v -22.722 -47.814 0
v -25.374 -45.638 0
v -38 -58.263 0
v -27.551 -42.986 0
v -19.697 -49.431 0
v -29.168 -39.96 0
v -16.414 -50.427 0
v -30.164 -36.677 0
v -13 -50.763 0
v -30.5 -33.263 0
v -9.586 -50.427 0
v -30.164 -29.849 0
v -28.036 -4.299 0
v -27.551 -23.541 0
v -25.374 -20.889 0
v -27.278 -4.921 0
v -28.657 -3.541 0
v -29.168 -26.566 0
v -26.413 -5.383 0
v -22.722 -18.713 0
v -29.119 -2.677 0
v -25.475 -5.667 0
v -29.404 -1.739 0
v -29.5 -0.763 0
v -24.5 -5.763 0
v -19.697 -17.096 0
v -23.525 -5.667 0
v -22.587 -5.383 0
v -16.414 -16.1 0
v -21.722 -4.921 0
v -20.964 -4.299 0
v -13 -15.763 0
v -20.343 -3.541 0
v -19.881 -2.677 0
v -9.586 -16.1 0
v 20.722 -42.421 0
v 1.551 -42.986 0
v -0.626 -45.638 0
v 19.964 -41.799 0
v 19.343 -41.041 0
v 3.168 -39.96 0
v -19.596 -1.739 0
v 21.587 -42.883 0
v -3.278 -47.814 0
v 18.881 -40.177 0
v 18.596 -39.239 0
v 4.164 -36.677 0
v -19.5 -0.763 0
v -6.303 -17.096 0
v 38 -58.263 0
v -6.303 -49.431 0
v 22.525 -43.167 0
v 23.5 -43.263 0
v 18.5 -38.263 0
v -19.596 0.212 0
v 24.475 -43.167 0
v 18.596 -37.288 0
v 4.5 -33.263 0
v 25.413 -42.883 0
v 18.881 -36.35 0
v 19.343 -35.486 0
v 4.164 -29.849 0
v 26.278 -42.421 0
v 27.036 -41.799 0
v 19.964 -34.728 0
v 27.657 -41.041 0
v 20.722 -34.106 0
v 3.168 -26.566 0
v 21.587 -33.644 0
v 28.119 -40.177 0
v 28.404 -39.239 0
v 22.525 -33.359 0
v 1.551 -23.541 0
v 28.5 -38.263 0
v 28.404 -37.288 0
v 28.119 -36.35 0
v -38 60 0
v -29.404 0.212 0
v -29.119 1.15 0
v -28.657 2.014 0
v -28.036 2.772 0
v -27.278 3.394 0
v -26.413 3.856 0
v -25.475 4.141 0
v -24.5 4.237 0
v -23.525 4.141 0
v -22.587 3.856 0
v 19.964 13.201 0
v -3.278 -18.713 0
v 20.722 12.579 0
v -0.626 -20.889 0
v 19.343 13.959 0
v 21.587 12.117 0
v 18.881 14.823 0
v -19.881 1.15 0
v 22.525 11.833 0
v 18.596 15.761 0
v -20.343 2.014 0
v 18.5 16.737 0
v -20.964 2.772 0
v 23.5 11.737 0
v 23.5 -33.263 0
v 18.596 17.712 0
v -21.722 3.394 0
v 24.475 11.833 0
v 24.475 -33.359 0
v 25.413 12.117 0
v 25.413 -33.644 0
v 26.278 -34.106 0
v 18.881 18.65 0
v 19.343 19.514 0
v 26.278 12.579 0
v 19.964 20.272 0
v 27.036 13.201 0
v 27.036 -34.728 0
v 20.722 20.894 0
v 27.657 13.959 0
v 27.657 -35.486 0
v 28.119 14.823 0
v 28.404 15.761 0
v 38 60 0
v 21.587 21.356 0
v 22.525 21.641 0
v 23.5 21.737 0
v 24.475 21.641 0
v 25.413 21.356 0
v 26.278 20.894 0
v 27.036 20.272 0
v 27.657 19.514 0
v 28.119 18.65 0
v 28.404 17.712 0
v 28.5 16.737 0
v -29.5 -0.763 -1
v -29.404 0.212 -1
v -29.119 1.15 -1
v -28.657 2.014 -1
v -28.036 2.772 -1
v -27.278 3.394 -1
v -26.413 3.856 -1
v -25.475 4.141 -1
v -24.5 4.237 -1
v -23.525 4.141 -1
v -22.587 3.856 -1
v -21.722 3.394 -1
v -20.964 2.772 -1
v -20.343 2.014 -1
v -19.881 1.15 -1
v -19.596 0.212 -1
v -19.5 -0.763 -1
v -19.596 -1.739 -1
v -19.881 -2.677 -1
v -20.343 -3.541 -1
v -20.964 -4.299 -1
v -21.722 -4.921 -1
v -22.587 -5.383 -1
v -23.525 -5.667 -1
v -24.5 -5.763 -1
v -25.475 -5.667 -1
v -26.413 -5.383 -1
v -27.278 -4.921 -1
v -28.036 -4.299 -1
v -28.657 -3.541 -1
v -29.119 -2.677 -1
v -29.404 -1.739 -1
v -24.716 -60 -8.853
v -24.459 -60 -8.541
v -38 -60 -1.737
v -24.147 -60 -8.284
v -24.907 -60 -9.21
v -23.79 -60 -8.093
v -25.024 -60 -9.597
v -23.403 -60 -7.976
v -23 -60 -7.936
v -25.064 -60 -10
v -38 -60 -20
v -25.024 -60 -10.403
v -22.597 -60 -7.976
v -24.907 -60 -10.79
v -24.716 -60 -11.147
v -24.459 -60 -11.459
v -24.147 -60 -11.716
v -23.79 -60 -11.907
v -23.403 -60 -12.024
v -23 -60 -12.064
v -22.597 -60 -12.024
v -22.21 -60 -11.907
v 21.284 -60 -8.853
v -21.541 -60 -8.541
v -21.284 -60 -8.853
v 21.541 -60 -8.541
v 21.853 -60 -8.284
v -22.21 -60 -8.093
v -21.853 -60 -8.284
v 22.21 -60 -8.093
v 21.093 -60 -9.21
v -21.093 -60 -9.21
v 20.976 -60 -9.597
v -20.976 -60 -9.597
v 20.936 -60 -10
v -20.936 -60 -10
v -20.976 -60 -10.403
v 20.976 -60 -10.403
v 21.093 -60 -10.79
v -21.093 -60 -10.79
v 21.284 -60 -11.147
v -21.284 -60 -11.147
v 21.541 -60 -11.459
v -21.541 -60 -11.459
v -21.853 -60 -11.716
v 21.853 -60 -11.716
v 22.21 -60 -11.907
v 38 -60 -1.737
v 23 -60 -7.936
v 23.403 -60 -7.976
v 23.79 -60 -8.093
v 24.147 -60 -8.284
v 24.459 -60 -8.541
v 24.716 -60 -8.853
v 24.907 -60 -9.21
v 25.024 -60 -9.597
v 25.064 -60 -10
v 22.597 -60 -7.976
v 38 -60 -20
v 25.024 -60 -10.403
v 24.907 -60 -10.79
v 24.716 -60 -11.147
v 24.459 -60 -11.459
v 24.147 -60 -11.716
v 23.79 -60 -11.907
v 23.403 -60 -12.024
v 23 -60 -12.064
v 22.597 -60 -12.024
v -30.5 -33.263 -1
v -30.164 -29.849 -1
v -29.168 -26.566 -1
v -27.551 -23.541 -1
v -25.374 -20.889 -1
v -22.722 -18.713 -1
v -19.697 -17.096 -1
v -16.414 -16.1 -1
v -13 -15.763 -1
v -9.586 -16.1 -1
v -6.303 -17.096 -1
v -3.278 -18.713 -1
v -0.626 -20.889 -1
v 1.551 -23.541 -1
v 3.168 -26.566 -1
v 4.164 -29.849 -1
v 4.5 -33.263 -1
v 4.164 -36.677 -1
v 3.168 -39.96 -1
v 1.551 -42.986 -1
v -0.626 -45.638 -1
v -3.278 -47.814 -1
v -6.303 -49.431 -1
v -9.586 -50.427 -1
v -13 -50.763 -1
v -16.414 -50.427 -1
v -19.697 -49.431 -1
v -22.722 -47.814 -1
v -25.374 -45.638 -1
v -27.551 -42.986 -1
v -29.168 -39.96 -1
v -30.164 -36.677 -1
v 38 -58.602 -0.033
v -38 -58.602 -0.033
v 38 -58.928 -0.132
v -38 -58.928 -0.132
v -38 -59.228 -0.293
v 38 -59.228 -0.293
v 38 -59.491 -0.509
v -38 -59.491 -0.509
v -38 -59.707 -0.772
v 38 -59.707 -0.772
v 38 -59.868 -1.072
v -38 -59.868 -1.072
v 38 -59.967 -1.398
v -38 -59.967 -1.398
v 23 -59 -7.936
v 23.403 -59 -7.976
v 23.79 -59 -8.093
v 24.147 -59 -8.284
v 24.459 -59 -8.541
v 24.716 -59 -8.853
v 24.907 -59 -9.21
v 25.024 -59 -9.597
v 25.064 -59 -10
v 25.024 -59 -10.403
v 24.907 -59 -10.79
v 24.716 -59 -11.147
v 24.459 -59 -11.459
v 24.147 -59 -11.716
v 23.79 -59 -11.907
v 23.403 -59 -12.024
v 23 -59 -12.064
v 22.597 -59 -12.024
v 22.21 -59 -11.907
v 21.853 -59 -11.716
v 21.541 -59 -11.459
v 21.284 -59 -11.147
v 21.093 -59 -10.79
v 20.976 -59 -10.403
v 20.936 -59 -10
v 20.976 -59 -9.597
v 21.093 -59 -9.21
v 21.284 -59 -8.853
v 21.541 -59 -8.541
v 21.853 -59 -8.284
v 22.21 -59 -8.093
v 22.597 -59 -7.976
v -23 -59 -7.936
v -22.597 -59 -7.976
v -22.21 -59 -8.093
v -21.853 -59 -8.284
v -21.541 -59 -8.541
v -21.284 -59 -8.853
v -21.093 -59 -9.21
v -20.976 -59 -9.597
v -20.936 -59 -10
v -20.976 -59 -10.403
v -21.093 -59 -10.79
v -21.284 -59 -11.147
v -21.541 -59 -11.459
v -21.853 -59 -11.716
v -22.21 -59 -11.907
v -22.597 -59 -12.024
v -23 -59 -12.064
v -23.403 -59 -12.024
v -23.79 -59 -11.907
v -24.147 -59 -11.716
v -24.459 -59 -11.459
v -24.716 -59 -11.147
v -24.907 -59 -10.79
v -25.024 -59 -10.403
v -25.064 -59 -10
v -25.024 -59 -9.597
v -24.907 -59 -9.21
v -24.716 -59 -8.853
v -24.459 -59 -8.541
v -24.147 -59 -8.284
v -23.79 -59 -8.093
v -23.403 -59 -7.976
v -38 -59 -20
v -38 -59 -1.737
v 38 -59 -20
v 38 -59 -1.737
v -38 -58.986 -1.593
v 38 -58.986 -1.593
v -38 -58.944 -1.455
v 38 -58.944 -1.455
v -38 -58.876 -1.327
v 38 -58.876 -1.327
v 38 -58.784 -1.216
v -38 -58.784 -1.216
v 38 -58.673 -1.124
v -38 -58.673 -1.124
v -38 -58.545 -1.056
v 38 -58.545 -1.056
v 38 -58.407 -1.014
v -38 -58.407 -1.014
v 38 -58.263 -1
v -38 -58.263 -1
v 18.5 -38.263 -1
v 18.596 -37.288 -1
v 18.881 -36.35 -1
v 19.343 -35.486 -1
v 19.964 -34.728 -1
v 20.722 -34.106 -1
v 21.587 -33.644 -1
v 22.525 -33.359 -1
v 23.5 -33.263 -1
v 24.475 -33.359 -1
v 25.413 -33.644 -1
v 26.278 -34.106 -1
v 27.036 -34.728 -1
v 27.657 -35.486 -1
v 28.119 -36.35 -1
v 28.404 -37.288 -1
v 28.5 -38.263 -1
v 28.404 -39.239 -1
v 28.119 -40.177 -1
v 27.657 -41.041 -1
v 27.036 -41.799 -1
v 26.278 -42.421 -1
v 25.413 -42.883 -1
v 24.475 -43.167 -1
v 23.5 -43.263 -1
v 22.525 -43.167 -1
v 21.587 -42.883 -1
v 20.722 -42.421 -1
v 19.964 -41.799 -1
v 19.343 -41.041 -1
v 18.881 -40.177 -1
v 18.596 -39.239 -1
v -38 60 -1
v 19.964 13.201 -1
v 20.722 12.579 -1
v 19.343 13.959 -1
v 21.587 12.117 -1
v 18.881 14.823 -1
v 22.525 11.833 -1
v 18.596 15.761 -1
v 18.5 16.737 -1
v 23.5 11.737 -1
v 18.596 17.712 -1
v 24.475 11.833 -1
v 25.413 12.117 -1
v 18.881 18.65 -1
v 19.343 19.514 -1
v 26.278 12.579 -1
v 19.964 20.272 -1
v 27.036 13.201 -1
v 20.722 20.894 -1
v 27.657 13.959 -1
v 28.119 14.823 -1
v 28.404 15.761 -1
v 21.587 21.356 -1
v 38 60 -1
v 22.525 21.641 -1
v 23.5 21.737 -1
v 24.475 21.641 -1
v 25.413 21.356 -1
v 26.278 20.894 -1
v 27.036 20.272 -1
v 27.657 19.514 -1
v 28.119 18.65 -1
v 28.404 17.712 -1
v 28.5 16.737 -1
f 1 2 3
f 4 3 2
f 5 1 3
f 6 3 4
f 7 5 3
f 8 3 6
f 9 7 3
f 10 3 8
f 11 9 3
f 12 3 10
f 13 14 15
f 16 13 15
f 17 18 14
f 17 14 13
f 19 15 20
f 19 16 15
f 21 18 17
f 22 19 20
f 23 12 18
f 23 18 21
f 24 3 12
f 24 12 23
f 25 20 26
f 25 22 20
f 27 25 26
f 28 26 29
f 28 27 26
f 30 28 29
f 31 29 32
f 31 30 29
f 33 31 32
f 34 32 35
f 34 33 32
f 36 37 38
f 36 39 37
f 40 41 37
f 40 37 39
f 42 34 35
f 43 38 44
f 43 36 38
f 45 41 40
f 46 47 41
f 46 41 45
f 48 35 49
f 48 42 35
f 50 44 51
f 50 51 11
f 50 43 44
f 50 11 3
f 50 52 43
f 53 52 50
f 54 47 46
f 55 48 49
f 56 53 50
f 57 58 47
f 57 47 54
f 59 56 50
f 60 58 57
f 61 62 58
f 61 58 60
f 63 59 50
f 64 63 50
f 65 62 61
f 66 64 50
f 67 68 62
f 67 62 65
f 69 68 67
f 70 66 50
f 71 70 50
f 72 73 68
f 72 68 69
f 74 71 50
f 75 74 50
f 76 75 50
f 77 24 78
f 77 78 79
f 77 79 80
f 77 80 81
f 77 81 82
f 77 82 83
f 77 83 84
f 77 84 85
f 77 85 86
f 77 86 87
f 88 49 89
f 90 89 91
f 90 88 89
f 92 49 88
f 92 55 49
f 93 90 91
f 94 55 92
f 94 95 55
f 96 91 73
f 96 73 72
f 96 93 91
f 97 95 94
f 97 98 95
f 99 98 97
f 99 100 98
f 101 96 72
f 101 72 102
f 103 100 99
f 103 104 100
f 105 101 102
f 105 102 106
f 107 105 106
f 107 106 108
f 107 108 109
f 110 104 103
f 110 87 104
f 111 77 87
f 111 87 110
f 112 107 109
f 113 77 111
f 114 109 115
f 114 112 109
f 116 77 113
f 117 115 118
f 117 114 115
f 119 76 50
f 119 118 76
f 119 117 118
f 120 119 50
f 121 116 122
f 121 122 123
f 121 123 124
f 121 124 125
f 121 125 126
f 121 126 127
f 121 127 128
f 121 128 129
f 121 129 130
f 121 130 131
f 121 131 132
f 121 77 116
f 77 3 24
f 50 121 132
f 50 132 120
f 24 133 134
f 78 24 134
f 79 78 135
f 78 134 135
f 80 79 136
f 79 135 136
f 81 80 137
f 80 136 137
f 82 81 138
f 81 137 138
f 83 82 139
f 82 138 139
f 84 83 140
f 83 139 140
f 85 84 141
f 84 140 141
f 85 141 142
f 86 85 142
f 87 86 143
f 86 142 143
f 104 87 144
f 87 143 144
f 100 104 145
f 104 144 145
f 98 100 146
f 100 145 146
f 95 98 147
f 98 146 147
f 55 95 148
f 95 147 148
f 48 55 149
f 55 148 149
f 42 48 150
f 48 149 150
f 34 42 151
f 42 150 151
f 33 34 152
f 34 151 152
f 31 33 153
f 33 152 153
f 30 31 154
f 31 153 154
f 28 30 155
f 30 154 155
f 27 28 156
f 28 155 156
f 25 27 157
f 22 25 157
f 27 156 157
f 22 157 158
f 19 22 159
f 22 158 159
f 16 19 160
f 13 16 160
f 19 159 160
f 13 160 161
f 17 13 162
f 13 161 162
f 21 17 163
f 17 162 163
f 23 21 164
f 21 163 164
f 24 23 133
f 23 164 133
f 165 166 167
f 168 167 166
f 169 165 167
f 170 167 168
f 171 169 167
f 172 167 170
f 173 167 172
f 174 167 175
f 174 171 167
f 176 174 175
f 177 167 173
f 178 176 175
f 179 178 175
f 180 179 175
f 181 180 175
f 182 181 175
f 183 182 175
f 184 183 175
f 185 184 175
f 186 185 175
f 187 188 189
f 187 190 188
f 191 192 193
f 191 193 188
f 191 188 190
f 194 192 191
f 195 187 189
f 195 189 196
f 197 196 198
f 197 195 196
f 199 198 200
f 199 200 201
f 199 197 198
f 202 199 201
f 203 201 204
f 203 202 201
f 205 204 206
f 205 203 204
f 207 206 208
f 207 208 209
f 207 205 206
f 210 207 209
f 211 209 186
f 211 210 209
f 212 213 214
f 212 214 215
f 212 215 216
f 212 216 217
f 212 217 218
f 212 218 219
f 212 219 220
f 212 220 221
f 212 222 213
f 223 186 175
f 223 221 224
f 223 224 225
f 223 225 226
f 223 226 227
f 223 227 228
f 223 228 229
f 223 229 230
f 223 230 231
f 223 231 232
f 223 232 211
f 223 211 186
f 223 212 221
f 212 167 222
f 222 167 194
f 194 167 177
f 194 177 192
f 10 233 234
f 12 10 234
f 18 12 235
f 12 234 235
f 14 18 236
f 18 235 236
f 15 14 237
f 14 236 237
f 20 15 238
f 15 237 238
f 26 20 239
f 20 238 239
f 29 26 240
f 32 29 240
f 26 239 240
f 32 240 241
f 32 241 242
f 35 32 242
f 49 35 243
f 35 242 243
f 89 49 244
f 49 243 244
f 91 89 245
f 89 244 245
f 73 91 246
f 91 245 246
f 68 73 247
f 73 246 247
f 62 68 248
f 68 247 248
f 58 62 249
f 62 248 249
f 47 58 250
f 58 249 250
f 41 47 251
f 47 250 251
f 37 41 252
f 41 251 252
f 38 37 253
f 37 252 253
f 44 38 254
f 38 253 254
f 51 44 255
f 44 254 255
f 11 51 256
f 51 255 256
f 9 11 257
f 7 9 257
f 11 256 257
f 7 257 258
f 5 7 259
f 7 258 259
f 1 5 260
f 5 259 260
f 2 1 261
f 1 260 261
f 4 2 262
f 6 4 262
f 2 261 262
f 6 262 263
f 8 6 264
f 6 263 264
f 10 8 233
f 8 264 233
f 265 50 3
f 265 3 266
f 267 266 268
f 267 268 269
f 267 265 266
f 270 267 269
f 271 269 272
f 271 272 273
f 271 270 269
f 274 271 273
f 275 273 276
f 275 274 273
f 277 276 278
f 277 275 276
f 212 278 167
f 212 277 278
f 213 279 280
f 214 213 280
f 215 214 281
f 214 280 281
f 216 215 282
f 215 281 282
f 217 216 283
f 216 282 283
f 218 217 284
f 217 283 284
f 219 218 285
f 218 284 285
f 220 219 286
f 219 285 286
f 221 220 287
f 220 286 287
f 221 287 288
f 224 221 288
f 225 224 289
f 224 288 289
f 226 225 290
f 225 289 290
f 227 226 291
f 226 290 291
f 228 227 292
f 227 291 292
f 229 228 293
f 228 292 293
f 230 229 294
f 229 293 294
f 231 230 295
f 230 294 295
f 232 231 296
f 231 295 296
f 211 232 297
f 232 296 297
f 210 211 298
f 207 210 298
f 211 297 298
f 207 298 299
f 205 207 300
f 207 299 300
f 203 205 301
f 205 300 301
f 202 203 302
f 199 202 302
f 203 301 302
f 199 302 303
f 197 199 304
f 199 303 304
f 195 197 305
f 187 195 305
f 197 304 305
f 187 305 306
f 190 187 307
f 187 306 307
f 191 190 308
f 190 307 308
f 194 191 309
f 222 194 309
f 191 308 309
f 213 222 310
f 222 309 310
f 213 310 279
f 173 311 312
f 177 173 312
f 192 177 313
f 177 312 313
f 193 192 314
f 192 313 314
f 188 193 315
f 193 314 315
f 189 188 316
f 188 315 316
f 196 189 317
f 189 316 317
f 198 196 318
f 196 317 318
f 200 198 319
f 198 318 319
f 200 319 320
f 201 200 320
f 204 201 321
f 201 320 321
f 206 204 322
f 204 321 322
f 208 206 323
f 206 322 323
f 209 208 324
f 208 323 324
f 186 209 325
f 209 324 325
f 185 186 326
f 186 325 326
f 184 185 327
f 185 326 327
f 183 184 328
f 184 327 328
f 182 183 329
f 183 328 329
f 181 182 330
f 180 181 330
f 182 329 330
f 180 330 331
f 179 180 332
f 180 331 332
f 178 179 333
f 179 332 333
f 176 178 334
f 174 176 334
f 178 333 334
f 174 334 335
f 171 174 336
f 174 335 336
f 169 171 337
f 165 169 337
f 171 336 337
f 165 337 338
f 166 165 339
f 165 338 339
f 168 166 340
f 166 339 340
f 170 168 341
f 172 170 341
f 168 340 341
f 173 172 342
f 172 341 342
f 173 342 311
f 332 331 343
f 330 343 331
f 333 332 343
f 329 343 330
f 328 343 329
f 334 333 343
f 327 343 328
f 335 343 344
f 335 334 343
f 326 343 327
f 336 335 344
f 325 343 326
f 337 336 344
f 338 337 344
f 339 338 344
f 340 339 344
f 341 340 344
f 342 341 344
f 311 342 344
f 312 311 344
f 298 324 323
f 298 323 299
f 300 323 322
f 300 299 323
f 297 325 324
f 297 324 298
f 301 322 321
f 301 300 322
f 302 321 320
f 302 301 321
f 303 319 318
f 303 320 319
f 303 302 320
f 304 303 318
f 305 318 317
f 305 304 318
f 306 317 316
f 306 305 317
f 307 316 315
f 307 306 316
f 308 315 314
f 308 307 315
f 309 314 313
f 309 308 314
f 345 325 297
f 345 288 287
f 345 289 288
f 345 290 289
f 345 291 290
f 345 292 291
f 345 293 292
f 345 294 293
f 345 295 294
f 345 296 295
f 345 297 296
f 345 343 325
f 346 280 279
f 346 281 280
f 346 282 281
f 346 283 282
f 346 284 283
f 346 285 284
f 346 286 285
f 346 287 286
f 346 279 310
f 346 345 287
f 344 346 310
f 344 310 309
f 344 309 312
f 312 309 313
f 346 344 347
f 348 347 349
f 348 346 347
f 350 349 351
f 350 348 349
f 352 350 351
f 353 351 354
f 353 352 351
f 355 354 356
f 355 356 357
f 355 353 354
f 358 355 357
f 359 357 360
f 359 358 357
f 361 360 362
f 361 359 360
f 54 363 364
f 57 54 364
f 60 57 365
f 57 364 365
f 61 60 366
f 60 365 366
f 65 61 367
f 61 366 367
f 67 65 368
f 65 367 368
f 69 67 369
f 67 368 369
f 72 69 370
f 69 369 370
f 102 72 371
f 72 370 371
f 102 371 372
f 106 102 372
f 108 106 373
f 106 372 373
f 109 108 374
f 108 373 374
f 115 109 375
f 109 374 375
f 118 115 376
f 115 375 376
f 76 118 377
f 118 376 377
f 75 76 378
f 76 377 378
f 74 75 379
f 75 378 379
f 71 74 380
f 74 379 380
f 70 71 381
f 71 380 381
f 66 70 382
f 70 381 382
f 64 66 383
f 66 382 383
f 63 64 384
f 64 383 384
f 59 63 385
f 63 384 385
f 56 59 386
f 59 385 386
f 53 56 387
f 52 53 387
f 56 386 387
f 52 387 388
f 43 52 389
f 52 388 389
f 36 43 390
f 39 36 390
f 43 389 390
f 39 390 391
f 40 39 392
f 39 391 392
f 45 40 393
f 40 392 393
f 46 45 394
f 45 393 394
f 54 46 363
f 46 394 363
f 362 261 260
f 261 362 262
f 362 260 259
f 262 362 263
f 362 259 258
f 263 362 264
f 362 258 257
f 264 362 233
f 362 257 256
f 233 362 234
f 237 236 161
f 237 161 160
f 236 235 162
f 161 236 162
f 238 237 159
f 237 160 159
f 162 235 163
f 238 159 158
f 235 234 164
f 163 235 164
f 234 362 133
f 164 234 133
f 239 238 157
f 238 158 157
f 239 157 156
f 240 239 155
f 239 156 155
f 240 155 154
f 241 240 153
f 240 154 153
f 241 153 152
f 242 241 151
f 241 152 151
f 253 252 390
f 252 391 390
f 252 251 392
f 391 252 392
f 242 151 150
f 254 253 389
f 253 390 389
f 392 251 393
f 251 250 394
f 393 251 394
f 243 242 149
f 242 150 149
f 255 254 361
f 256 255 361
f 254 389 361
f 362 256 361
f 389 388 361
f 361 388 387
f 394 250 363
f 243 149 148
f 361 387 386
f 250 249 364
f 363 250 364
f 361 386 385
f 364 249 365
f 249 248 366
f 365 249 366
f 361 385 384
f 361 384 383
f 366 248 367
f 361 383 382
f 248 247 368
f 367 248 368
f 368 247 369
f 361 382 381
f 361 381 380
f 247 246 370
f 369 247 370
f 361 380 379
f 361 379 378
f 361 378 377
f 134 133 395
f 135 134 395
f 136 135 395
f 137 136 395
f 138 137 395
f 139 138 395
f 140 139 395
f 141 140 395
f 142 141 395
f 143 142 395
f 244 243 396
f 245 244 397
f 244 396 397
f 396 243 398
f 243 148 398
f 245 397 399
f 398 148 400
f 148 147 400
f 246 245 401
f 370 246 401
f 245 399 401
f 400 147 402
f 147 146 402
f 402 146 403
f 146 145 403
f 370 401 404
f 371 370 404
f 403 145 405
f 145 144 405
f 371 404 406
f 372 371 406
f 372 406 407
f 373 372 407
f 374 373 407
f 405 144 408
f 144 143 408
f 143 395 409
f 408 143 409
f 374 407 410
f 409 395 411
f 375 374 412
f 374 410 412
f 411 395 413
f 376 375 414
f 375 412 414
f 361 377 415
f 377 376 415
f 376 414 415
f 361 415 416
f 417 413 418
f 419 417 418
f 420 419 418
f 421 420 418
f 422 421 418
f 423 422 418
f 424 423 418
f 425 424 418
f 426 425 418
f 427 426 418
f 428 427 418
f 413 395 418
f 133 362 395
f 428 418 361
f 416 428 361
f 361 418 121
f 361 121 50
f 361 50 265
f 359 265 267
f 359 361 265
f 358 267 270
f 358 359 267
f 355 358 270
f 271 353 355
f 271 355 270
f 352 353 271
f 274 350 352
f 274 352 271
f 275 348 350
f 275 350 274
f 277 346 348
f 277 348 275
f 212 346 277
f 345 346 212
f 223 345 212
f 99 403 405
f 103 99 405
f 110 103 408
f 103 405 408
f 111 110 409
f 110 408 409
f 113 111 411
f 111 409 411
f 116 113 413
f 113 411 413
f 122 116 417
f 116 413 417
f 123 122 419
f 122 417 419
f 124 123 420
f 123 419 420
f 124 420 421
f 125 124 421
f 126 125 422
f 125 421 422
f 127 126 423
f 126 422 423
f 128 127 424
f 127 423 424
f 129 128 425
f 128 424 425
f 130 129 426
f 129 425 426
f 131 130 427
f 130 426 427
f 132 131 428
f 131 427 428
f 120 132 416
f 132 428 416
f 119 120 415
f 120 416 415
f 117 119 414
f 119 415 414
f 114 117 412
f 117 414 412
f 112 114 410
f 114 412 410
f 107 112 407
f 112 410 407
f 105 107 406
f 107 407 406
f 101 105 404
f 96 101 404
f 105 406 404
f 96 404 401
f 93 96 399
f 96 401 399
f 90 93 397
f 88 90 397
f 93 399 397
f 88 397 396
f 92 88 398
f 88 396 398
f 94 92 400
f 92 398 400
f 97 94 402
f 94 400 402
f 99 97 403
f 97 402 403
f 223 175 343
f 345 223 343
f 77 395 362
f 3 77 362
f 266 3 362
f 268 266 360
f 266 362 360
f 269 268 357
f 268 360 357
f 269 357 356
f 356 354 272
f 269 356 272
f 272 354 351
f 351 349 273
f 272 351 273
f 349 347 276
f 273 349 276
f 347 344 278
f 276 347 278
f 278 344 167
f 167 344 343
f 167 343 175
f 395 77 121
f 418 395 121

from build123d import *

# Parameters (mm, degrees)
SKETCH2_W                    = 76
SKETCH2_H                    = 120
BASE_FLANGE1_DEPTH           = 1
EDGE_FLANGE1_STRIP_W         = 5.4732
EDGE_FLANGE1_STRIP_H         = 1
EDGE_FLANGE1_STRIP_CUT_DEPTH = 76
EDGE_FLANGE1_DEPTH           = 76
SKETCH10_R                   = 2.063994429
CUT_EXTRUDE1_DEPTH           = 1
SKETCH11_R                   = 5
SKETCH11_R_2                 = 17.5
CUT_EXTRUDE2_DEPTH           = 1


# Sheet-metal steps are written as plain solids
with BuildPart() as part:
    # Sketch2 → Base-Flange1 (new body)
    with BuildSketch(Plane.XY):
        Rectangle(SKETCH2_W, SKETCH2_H)
    extrude(amount=-BASE_FLANGE1_DEPTH)

    # Edge-Flange1 strip (across the edge) → Edge-Flange1 strip cut (cut)
    with BuildSketch(Plane(origin=(38, -60, -1), x_dir=(0, 1, 0), z_dir=(-1, 0, 0))):
        with Locations((-1, -0.5)):
            Rectangle(EDGE_FLANGE1_STRIP_W, EDGE_FLANGE1_STRIP_H)
    extrude(amount=EDGE_FLANGE1_STRIP_CUT_DEPTH, mode=Mode.SUBTRACT)

    # Edge-Flange1 section (across the edge) → Edge-Flange1 (add)
    with BuildSketch(Plane(origin=(38, -60, -1), x_dir=(0, 1, 0), z_dir=(-1, 0, 0))):
        with BuildLine():
            Line((0, 0.7366), (0, 19))
            Line((0, 19), (1, 19))
            Line((1, 19), (1, 0.7366))
            ThreePointArc((1, 0.7366), (1.215745145, 0.215745145), (1.7366, 0))
            Line((1.7366, 0), (1.7366, -1))
            ThreePointArc((1.7366, -1), (0.508638364, -0.491361636), (0, 0.7366))
        make_face()
    extrude(amount=EDGE_FLANGE1_DEPTH)

    # Sketch10 → Cut-Extrude1 (cut)
    with BuildSketch(Plane(origin=(0, -59, 0), x_dir=(1, 0, 0), z_dir=(0, 1, 0))):
        with Locations(Location((-23, 10, 0), (0, 0, 270))):
            Circle(SKETCH10_R)
        with Locations(Location((23, 10, 0), (0, 0, 270))):
            Circle(SKETCH10_R)
    extrude(amount=-CUT_EXTRUDE1_DEPTH, mode=Mode.SUBTRACT)

    # Sketch11 → Cut-Extrude2 (cut)
    with BuildSketch(Plane(origin=(0, 0, -1), x_dir=(-1, 0, 0), z_dir=(0, 0, -1))):
        with Locations((-23.5, -38.2634)):
            Circle(SKETCH11_R)
        with Locations((13, -33.2634)):
            Circle(SKETCH11_R_2)
        with Locations((24.5, -0.7634)):
            Circle(SKETCH11_R)
        with Locations((-23.5, 16.7366)):
            Circle(SKETCH11_R)
    extrude(amount=-CUT_EXTRUDE2_DEPTH, mode=Mode.SUBTRACT)


solid = part.part
